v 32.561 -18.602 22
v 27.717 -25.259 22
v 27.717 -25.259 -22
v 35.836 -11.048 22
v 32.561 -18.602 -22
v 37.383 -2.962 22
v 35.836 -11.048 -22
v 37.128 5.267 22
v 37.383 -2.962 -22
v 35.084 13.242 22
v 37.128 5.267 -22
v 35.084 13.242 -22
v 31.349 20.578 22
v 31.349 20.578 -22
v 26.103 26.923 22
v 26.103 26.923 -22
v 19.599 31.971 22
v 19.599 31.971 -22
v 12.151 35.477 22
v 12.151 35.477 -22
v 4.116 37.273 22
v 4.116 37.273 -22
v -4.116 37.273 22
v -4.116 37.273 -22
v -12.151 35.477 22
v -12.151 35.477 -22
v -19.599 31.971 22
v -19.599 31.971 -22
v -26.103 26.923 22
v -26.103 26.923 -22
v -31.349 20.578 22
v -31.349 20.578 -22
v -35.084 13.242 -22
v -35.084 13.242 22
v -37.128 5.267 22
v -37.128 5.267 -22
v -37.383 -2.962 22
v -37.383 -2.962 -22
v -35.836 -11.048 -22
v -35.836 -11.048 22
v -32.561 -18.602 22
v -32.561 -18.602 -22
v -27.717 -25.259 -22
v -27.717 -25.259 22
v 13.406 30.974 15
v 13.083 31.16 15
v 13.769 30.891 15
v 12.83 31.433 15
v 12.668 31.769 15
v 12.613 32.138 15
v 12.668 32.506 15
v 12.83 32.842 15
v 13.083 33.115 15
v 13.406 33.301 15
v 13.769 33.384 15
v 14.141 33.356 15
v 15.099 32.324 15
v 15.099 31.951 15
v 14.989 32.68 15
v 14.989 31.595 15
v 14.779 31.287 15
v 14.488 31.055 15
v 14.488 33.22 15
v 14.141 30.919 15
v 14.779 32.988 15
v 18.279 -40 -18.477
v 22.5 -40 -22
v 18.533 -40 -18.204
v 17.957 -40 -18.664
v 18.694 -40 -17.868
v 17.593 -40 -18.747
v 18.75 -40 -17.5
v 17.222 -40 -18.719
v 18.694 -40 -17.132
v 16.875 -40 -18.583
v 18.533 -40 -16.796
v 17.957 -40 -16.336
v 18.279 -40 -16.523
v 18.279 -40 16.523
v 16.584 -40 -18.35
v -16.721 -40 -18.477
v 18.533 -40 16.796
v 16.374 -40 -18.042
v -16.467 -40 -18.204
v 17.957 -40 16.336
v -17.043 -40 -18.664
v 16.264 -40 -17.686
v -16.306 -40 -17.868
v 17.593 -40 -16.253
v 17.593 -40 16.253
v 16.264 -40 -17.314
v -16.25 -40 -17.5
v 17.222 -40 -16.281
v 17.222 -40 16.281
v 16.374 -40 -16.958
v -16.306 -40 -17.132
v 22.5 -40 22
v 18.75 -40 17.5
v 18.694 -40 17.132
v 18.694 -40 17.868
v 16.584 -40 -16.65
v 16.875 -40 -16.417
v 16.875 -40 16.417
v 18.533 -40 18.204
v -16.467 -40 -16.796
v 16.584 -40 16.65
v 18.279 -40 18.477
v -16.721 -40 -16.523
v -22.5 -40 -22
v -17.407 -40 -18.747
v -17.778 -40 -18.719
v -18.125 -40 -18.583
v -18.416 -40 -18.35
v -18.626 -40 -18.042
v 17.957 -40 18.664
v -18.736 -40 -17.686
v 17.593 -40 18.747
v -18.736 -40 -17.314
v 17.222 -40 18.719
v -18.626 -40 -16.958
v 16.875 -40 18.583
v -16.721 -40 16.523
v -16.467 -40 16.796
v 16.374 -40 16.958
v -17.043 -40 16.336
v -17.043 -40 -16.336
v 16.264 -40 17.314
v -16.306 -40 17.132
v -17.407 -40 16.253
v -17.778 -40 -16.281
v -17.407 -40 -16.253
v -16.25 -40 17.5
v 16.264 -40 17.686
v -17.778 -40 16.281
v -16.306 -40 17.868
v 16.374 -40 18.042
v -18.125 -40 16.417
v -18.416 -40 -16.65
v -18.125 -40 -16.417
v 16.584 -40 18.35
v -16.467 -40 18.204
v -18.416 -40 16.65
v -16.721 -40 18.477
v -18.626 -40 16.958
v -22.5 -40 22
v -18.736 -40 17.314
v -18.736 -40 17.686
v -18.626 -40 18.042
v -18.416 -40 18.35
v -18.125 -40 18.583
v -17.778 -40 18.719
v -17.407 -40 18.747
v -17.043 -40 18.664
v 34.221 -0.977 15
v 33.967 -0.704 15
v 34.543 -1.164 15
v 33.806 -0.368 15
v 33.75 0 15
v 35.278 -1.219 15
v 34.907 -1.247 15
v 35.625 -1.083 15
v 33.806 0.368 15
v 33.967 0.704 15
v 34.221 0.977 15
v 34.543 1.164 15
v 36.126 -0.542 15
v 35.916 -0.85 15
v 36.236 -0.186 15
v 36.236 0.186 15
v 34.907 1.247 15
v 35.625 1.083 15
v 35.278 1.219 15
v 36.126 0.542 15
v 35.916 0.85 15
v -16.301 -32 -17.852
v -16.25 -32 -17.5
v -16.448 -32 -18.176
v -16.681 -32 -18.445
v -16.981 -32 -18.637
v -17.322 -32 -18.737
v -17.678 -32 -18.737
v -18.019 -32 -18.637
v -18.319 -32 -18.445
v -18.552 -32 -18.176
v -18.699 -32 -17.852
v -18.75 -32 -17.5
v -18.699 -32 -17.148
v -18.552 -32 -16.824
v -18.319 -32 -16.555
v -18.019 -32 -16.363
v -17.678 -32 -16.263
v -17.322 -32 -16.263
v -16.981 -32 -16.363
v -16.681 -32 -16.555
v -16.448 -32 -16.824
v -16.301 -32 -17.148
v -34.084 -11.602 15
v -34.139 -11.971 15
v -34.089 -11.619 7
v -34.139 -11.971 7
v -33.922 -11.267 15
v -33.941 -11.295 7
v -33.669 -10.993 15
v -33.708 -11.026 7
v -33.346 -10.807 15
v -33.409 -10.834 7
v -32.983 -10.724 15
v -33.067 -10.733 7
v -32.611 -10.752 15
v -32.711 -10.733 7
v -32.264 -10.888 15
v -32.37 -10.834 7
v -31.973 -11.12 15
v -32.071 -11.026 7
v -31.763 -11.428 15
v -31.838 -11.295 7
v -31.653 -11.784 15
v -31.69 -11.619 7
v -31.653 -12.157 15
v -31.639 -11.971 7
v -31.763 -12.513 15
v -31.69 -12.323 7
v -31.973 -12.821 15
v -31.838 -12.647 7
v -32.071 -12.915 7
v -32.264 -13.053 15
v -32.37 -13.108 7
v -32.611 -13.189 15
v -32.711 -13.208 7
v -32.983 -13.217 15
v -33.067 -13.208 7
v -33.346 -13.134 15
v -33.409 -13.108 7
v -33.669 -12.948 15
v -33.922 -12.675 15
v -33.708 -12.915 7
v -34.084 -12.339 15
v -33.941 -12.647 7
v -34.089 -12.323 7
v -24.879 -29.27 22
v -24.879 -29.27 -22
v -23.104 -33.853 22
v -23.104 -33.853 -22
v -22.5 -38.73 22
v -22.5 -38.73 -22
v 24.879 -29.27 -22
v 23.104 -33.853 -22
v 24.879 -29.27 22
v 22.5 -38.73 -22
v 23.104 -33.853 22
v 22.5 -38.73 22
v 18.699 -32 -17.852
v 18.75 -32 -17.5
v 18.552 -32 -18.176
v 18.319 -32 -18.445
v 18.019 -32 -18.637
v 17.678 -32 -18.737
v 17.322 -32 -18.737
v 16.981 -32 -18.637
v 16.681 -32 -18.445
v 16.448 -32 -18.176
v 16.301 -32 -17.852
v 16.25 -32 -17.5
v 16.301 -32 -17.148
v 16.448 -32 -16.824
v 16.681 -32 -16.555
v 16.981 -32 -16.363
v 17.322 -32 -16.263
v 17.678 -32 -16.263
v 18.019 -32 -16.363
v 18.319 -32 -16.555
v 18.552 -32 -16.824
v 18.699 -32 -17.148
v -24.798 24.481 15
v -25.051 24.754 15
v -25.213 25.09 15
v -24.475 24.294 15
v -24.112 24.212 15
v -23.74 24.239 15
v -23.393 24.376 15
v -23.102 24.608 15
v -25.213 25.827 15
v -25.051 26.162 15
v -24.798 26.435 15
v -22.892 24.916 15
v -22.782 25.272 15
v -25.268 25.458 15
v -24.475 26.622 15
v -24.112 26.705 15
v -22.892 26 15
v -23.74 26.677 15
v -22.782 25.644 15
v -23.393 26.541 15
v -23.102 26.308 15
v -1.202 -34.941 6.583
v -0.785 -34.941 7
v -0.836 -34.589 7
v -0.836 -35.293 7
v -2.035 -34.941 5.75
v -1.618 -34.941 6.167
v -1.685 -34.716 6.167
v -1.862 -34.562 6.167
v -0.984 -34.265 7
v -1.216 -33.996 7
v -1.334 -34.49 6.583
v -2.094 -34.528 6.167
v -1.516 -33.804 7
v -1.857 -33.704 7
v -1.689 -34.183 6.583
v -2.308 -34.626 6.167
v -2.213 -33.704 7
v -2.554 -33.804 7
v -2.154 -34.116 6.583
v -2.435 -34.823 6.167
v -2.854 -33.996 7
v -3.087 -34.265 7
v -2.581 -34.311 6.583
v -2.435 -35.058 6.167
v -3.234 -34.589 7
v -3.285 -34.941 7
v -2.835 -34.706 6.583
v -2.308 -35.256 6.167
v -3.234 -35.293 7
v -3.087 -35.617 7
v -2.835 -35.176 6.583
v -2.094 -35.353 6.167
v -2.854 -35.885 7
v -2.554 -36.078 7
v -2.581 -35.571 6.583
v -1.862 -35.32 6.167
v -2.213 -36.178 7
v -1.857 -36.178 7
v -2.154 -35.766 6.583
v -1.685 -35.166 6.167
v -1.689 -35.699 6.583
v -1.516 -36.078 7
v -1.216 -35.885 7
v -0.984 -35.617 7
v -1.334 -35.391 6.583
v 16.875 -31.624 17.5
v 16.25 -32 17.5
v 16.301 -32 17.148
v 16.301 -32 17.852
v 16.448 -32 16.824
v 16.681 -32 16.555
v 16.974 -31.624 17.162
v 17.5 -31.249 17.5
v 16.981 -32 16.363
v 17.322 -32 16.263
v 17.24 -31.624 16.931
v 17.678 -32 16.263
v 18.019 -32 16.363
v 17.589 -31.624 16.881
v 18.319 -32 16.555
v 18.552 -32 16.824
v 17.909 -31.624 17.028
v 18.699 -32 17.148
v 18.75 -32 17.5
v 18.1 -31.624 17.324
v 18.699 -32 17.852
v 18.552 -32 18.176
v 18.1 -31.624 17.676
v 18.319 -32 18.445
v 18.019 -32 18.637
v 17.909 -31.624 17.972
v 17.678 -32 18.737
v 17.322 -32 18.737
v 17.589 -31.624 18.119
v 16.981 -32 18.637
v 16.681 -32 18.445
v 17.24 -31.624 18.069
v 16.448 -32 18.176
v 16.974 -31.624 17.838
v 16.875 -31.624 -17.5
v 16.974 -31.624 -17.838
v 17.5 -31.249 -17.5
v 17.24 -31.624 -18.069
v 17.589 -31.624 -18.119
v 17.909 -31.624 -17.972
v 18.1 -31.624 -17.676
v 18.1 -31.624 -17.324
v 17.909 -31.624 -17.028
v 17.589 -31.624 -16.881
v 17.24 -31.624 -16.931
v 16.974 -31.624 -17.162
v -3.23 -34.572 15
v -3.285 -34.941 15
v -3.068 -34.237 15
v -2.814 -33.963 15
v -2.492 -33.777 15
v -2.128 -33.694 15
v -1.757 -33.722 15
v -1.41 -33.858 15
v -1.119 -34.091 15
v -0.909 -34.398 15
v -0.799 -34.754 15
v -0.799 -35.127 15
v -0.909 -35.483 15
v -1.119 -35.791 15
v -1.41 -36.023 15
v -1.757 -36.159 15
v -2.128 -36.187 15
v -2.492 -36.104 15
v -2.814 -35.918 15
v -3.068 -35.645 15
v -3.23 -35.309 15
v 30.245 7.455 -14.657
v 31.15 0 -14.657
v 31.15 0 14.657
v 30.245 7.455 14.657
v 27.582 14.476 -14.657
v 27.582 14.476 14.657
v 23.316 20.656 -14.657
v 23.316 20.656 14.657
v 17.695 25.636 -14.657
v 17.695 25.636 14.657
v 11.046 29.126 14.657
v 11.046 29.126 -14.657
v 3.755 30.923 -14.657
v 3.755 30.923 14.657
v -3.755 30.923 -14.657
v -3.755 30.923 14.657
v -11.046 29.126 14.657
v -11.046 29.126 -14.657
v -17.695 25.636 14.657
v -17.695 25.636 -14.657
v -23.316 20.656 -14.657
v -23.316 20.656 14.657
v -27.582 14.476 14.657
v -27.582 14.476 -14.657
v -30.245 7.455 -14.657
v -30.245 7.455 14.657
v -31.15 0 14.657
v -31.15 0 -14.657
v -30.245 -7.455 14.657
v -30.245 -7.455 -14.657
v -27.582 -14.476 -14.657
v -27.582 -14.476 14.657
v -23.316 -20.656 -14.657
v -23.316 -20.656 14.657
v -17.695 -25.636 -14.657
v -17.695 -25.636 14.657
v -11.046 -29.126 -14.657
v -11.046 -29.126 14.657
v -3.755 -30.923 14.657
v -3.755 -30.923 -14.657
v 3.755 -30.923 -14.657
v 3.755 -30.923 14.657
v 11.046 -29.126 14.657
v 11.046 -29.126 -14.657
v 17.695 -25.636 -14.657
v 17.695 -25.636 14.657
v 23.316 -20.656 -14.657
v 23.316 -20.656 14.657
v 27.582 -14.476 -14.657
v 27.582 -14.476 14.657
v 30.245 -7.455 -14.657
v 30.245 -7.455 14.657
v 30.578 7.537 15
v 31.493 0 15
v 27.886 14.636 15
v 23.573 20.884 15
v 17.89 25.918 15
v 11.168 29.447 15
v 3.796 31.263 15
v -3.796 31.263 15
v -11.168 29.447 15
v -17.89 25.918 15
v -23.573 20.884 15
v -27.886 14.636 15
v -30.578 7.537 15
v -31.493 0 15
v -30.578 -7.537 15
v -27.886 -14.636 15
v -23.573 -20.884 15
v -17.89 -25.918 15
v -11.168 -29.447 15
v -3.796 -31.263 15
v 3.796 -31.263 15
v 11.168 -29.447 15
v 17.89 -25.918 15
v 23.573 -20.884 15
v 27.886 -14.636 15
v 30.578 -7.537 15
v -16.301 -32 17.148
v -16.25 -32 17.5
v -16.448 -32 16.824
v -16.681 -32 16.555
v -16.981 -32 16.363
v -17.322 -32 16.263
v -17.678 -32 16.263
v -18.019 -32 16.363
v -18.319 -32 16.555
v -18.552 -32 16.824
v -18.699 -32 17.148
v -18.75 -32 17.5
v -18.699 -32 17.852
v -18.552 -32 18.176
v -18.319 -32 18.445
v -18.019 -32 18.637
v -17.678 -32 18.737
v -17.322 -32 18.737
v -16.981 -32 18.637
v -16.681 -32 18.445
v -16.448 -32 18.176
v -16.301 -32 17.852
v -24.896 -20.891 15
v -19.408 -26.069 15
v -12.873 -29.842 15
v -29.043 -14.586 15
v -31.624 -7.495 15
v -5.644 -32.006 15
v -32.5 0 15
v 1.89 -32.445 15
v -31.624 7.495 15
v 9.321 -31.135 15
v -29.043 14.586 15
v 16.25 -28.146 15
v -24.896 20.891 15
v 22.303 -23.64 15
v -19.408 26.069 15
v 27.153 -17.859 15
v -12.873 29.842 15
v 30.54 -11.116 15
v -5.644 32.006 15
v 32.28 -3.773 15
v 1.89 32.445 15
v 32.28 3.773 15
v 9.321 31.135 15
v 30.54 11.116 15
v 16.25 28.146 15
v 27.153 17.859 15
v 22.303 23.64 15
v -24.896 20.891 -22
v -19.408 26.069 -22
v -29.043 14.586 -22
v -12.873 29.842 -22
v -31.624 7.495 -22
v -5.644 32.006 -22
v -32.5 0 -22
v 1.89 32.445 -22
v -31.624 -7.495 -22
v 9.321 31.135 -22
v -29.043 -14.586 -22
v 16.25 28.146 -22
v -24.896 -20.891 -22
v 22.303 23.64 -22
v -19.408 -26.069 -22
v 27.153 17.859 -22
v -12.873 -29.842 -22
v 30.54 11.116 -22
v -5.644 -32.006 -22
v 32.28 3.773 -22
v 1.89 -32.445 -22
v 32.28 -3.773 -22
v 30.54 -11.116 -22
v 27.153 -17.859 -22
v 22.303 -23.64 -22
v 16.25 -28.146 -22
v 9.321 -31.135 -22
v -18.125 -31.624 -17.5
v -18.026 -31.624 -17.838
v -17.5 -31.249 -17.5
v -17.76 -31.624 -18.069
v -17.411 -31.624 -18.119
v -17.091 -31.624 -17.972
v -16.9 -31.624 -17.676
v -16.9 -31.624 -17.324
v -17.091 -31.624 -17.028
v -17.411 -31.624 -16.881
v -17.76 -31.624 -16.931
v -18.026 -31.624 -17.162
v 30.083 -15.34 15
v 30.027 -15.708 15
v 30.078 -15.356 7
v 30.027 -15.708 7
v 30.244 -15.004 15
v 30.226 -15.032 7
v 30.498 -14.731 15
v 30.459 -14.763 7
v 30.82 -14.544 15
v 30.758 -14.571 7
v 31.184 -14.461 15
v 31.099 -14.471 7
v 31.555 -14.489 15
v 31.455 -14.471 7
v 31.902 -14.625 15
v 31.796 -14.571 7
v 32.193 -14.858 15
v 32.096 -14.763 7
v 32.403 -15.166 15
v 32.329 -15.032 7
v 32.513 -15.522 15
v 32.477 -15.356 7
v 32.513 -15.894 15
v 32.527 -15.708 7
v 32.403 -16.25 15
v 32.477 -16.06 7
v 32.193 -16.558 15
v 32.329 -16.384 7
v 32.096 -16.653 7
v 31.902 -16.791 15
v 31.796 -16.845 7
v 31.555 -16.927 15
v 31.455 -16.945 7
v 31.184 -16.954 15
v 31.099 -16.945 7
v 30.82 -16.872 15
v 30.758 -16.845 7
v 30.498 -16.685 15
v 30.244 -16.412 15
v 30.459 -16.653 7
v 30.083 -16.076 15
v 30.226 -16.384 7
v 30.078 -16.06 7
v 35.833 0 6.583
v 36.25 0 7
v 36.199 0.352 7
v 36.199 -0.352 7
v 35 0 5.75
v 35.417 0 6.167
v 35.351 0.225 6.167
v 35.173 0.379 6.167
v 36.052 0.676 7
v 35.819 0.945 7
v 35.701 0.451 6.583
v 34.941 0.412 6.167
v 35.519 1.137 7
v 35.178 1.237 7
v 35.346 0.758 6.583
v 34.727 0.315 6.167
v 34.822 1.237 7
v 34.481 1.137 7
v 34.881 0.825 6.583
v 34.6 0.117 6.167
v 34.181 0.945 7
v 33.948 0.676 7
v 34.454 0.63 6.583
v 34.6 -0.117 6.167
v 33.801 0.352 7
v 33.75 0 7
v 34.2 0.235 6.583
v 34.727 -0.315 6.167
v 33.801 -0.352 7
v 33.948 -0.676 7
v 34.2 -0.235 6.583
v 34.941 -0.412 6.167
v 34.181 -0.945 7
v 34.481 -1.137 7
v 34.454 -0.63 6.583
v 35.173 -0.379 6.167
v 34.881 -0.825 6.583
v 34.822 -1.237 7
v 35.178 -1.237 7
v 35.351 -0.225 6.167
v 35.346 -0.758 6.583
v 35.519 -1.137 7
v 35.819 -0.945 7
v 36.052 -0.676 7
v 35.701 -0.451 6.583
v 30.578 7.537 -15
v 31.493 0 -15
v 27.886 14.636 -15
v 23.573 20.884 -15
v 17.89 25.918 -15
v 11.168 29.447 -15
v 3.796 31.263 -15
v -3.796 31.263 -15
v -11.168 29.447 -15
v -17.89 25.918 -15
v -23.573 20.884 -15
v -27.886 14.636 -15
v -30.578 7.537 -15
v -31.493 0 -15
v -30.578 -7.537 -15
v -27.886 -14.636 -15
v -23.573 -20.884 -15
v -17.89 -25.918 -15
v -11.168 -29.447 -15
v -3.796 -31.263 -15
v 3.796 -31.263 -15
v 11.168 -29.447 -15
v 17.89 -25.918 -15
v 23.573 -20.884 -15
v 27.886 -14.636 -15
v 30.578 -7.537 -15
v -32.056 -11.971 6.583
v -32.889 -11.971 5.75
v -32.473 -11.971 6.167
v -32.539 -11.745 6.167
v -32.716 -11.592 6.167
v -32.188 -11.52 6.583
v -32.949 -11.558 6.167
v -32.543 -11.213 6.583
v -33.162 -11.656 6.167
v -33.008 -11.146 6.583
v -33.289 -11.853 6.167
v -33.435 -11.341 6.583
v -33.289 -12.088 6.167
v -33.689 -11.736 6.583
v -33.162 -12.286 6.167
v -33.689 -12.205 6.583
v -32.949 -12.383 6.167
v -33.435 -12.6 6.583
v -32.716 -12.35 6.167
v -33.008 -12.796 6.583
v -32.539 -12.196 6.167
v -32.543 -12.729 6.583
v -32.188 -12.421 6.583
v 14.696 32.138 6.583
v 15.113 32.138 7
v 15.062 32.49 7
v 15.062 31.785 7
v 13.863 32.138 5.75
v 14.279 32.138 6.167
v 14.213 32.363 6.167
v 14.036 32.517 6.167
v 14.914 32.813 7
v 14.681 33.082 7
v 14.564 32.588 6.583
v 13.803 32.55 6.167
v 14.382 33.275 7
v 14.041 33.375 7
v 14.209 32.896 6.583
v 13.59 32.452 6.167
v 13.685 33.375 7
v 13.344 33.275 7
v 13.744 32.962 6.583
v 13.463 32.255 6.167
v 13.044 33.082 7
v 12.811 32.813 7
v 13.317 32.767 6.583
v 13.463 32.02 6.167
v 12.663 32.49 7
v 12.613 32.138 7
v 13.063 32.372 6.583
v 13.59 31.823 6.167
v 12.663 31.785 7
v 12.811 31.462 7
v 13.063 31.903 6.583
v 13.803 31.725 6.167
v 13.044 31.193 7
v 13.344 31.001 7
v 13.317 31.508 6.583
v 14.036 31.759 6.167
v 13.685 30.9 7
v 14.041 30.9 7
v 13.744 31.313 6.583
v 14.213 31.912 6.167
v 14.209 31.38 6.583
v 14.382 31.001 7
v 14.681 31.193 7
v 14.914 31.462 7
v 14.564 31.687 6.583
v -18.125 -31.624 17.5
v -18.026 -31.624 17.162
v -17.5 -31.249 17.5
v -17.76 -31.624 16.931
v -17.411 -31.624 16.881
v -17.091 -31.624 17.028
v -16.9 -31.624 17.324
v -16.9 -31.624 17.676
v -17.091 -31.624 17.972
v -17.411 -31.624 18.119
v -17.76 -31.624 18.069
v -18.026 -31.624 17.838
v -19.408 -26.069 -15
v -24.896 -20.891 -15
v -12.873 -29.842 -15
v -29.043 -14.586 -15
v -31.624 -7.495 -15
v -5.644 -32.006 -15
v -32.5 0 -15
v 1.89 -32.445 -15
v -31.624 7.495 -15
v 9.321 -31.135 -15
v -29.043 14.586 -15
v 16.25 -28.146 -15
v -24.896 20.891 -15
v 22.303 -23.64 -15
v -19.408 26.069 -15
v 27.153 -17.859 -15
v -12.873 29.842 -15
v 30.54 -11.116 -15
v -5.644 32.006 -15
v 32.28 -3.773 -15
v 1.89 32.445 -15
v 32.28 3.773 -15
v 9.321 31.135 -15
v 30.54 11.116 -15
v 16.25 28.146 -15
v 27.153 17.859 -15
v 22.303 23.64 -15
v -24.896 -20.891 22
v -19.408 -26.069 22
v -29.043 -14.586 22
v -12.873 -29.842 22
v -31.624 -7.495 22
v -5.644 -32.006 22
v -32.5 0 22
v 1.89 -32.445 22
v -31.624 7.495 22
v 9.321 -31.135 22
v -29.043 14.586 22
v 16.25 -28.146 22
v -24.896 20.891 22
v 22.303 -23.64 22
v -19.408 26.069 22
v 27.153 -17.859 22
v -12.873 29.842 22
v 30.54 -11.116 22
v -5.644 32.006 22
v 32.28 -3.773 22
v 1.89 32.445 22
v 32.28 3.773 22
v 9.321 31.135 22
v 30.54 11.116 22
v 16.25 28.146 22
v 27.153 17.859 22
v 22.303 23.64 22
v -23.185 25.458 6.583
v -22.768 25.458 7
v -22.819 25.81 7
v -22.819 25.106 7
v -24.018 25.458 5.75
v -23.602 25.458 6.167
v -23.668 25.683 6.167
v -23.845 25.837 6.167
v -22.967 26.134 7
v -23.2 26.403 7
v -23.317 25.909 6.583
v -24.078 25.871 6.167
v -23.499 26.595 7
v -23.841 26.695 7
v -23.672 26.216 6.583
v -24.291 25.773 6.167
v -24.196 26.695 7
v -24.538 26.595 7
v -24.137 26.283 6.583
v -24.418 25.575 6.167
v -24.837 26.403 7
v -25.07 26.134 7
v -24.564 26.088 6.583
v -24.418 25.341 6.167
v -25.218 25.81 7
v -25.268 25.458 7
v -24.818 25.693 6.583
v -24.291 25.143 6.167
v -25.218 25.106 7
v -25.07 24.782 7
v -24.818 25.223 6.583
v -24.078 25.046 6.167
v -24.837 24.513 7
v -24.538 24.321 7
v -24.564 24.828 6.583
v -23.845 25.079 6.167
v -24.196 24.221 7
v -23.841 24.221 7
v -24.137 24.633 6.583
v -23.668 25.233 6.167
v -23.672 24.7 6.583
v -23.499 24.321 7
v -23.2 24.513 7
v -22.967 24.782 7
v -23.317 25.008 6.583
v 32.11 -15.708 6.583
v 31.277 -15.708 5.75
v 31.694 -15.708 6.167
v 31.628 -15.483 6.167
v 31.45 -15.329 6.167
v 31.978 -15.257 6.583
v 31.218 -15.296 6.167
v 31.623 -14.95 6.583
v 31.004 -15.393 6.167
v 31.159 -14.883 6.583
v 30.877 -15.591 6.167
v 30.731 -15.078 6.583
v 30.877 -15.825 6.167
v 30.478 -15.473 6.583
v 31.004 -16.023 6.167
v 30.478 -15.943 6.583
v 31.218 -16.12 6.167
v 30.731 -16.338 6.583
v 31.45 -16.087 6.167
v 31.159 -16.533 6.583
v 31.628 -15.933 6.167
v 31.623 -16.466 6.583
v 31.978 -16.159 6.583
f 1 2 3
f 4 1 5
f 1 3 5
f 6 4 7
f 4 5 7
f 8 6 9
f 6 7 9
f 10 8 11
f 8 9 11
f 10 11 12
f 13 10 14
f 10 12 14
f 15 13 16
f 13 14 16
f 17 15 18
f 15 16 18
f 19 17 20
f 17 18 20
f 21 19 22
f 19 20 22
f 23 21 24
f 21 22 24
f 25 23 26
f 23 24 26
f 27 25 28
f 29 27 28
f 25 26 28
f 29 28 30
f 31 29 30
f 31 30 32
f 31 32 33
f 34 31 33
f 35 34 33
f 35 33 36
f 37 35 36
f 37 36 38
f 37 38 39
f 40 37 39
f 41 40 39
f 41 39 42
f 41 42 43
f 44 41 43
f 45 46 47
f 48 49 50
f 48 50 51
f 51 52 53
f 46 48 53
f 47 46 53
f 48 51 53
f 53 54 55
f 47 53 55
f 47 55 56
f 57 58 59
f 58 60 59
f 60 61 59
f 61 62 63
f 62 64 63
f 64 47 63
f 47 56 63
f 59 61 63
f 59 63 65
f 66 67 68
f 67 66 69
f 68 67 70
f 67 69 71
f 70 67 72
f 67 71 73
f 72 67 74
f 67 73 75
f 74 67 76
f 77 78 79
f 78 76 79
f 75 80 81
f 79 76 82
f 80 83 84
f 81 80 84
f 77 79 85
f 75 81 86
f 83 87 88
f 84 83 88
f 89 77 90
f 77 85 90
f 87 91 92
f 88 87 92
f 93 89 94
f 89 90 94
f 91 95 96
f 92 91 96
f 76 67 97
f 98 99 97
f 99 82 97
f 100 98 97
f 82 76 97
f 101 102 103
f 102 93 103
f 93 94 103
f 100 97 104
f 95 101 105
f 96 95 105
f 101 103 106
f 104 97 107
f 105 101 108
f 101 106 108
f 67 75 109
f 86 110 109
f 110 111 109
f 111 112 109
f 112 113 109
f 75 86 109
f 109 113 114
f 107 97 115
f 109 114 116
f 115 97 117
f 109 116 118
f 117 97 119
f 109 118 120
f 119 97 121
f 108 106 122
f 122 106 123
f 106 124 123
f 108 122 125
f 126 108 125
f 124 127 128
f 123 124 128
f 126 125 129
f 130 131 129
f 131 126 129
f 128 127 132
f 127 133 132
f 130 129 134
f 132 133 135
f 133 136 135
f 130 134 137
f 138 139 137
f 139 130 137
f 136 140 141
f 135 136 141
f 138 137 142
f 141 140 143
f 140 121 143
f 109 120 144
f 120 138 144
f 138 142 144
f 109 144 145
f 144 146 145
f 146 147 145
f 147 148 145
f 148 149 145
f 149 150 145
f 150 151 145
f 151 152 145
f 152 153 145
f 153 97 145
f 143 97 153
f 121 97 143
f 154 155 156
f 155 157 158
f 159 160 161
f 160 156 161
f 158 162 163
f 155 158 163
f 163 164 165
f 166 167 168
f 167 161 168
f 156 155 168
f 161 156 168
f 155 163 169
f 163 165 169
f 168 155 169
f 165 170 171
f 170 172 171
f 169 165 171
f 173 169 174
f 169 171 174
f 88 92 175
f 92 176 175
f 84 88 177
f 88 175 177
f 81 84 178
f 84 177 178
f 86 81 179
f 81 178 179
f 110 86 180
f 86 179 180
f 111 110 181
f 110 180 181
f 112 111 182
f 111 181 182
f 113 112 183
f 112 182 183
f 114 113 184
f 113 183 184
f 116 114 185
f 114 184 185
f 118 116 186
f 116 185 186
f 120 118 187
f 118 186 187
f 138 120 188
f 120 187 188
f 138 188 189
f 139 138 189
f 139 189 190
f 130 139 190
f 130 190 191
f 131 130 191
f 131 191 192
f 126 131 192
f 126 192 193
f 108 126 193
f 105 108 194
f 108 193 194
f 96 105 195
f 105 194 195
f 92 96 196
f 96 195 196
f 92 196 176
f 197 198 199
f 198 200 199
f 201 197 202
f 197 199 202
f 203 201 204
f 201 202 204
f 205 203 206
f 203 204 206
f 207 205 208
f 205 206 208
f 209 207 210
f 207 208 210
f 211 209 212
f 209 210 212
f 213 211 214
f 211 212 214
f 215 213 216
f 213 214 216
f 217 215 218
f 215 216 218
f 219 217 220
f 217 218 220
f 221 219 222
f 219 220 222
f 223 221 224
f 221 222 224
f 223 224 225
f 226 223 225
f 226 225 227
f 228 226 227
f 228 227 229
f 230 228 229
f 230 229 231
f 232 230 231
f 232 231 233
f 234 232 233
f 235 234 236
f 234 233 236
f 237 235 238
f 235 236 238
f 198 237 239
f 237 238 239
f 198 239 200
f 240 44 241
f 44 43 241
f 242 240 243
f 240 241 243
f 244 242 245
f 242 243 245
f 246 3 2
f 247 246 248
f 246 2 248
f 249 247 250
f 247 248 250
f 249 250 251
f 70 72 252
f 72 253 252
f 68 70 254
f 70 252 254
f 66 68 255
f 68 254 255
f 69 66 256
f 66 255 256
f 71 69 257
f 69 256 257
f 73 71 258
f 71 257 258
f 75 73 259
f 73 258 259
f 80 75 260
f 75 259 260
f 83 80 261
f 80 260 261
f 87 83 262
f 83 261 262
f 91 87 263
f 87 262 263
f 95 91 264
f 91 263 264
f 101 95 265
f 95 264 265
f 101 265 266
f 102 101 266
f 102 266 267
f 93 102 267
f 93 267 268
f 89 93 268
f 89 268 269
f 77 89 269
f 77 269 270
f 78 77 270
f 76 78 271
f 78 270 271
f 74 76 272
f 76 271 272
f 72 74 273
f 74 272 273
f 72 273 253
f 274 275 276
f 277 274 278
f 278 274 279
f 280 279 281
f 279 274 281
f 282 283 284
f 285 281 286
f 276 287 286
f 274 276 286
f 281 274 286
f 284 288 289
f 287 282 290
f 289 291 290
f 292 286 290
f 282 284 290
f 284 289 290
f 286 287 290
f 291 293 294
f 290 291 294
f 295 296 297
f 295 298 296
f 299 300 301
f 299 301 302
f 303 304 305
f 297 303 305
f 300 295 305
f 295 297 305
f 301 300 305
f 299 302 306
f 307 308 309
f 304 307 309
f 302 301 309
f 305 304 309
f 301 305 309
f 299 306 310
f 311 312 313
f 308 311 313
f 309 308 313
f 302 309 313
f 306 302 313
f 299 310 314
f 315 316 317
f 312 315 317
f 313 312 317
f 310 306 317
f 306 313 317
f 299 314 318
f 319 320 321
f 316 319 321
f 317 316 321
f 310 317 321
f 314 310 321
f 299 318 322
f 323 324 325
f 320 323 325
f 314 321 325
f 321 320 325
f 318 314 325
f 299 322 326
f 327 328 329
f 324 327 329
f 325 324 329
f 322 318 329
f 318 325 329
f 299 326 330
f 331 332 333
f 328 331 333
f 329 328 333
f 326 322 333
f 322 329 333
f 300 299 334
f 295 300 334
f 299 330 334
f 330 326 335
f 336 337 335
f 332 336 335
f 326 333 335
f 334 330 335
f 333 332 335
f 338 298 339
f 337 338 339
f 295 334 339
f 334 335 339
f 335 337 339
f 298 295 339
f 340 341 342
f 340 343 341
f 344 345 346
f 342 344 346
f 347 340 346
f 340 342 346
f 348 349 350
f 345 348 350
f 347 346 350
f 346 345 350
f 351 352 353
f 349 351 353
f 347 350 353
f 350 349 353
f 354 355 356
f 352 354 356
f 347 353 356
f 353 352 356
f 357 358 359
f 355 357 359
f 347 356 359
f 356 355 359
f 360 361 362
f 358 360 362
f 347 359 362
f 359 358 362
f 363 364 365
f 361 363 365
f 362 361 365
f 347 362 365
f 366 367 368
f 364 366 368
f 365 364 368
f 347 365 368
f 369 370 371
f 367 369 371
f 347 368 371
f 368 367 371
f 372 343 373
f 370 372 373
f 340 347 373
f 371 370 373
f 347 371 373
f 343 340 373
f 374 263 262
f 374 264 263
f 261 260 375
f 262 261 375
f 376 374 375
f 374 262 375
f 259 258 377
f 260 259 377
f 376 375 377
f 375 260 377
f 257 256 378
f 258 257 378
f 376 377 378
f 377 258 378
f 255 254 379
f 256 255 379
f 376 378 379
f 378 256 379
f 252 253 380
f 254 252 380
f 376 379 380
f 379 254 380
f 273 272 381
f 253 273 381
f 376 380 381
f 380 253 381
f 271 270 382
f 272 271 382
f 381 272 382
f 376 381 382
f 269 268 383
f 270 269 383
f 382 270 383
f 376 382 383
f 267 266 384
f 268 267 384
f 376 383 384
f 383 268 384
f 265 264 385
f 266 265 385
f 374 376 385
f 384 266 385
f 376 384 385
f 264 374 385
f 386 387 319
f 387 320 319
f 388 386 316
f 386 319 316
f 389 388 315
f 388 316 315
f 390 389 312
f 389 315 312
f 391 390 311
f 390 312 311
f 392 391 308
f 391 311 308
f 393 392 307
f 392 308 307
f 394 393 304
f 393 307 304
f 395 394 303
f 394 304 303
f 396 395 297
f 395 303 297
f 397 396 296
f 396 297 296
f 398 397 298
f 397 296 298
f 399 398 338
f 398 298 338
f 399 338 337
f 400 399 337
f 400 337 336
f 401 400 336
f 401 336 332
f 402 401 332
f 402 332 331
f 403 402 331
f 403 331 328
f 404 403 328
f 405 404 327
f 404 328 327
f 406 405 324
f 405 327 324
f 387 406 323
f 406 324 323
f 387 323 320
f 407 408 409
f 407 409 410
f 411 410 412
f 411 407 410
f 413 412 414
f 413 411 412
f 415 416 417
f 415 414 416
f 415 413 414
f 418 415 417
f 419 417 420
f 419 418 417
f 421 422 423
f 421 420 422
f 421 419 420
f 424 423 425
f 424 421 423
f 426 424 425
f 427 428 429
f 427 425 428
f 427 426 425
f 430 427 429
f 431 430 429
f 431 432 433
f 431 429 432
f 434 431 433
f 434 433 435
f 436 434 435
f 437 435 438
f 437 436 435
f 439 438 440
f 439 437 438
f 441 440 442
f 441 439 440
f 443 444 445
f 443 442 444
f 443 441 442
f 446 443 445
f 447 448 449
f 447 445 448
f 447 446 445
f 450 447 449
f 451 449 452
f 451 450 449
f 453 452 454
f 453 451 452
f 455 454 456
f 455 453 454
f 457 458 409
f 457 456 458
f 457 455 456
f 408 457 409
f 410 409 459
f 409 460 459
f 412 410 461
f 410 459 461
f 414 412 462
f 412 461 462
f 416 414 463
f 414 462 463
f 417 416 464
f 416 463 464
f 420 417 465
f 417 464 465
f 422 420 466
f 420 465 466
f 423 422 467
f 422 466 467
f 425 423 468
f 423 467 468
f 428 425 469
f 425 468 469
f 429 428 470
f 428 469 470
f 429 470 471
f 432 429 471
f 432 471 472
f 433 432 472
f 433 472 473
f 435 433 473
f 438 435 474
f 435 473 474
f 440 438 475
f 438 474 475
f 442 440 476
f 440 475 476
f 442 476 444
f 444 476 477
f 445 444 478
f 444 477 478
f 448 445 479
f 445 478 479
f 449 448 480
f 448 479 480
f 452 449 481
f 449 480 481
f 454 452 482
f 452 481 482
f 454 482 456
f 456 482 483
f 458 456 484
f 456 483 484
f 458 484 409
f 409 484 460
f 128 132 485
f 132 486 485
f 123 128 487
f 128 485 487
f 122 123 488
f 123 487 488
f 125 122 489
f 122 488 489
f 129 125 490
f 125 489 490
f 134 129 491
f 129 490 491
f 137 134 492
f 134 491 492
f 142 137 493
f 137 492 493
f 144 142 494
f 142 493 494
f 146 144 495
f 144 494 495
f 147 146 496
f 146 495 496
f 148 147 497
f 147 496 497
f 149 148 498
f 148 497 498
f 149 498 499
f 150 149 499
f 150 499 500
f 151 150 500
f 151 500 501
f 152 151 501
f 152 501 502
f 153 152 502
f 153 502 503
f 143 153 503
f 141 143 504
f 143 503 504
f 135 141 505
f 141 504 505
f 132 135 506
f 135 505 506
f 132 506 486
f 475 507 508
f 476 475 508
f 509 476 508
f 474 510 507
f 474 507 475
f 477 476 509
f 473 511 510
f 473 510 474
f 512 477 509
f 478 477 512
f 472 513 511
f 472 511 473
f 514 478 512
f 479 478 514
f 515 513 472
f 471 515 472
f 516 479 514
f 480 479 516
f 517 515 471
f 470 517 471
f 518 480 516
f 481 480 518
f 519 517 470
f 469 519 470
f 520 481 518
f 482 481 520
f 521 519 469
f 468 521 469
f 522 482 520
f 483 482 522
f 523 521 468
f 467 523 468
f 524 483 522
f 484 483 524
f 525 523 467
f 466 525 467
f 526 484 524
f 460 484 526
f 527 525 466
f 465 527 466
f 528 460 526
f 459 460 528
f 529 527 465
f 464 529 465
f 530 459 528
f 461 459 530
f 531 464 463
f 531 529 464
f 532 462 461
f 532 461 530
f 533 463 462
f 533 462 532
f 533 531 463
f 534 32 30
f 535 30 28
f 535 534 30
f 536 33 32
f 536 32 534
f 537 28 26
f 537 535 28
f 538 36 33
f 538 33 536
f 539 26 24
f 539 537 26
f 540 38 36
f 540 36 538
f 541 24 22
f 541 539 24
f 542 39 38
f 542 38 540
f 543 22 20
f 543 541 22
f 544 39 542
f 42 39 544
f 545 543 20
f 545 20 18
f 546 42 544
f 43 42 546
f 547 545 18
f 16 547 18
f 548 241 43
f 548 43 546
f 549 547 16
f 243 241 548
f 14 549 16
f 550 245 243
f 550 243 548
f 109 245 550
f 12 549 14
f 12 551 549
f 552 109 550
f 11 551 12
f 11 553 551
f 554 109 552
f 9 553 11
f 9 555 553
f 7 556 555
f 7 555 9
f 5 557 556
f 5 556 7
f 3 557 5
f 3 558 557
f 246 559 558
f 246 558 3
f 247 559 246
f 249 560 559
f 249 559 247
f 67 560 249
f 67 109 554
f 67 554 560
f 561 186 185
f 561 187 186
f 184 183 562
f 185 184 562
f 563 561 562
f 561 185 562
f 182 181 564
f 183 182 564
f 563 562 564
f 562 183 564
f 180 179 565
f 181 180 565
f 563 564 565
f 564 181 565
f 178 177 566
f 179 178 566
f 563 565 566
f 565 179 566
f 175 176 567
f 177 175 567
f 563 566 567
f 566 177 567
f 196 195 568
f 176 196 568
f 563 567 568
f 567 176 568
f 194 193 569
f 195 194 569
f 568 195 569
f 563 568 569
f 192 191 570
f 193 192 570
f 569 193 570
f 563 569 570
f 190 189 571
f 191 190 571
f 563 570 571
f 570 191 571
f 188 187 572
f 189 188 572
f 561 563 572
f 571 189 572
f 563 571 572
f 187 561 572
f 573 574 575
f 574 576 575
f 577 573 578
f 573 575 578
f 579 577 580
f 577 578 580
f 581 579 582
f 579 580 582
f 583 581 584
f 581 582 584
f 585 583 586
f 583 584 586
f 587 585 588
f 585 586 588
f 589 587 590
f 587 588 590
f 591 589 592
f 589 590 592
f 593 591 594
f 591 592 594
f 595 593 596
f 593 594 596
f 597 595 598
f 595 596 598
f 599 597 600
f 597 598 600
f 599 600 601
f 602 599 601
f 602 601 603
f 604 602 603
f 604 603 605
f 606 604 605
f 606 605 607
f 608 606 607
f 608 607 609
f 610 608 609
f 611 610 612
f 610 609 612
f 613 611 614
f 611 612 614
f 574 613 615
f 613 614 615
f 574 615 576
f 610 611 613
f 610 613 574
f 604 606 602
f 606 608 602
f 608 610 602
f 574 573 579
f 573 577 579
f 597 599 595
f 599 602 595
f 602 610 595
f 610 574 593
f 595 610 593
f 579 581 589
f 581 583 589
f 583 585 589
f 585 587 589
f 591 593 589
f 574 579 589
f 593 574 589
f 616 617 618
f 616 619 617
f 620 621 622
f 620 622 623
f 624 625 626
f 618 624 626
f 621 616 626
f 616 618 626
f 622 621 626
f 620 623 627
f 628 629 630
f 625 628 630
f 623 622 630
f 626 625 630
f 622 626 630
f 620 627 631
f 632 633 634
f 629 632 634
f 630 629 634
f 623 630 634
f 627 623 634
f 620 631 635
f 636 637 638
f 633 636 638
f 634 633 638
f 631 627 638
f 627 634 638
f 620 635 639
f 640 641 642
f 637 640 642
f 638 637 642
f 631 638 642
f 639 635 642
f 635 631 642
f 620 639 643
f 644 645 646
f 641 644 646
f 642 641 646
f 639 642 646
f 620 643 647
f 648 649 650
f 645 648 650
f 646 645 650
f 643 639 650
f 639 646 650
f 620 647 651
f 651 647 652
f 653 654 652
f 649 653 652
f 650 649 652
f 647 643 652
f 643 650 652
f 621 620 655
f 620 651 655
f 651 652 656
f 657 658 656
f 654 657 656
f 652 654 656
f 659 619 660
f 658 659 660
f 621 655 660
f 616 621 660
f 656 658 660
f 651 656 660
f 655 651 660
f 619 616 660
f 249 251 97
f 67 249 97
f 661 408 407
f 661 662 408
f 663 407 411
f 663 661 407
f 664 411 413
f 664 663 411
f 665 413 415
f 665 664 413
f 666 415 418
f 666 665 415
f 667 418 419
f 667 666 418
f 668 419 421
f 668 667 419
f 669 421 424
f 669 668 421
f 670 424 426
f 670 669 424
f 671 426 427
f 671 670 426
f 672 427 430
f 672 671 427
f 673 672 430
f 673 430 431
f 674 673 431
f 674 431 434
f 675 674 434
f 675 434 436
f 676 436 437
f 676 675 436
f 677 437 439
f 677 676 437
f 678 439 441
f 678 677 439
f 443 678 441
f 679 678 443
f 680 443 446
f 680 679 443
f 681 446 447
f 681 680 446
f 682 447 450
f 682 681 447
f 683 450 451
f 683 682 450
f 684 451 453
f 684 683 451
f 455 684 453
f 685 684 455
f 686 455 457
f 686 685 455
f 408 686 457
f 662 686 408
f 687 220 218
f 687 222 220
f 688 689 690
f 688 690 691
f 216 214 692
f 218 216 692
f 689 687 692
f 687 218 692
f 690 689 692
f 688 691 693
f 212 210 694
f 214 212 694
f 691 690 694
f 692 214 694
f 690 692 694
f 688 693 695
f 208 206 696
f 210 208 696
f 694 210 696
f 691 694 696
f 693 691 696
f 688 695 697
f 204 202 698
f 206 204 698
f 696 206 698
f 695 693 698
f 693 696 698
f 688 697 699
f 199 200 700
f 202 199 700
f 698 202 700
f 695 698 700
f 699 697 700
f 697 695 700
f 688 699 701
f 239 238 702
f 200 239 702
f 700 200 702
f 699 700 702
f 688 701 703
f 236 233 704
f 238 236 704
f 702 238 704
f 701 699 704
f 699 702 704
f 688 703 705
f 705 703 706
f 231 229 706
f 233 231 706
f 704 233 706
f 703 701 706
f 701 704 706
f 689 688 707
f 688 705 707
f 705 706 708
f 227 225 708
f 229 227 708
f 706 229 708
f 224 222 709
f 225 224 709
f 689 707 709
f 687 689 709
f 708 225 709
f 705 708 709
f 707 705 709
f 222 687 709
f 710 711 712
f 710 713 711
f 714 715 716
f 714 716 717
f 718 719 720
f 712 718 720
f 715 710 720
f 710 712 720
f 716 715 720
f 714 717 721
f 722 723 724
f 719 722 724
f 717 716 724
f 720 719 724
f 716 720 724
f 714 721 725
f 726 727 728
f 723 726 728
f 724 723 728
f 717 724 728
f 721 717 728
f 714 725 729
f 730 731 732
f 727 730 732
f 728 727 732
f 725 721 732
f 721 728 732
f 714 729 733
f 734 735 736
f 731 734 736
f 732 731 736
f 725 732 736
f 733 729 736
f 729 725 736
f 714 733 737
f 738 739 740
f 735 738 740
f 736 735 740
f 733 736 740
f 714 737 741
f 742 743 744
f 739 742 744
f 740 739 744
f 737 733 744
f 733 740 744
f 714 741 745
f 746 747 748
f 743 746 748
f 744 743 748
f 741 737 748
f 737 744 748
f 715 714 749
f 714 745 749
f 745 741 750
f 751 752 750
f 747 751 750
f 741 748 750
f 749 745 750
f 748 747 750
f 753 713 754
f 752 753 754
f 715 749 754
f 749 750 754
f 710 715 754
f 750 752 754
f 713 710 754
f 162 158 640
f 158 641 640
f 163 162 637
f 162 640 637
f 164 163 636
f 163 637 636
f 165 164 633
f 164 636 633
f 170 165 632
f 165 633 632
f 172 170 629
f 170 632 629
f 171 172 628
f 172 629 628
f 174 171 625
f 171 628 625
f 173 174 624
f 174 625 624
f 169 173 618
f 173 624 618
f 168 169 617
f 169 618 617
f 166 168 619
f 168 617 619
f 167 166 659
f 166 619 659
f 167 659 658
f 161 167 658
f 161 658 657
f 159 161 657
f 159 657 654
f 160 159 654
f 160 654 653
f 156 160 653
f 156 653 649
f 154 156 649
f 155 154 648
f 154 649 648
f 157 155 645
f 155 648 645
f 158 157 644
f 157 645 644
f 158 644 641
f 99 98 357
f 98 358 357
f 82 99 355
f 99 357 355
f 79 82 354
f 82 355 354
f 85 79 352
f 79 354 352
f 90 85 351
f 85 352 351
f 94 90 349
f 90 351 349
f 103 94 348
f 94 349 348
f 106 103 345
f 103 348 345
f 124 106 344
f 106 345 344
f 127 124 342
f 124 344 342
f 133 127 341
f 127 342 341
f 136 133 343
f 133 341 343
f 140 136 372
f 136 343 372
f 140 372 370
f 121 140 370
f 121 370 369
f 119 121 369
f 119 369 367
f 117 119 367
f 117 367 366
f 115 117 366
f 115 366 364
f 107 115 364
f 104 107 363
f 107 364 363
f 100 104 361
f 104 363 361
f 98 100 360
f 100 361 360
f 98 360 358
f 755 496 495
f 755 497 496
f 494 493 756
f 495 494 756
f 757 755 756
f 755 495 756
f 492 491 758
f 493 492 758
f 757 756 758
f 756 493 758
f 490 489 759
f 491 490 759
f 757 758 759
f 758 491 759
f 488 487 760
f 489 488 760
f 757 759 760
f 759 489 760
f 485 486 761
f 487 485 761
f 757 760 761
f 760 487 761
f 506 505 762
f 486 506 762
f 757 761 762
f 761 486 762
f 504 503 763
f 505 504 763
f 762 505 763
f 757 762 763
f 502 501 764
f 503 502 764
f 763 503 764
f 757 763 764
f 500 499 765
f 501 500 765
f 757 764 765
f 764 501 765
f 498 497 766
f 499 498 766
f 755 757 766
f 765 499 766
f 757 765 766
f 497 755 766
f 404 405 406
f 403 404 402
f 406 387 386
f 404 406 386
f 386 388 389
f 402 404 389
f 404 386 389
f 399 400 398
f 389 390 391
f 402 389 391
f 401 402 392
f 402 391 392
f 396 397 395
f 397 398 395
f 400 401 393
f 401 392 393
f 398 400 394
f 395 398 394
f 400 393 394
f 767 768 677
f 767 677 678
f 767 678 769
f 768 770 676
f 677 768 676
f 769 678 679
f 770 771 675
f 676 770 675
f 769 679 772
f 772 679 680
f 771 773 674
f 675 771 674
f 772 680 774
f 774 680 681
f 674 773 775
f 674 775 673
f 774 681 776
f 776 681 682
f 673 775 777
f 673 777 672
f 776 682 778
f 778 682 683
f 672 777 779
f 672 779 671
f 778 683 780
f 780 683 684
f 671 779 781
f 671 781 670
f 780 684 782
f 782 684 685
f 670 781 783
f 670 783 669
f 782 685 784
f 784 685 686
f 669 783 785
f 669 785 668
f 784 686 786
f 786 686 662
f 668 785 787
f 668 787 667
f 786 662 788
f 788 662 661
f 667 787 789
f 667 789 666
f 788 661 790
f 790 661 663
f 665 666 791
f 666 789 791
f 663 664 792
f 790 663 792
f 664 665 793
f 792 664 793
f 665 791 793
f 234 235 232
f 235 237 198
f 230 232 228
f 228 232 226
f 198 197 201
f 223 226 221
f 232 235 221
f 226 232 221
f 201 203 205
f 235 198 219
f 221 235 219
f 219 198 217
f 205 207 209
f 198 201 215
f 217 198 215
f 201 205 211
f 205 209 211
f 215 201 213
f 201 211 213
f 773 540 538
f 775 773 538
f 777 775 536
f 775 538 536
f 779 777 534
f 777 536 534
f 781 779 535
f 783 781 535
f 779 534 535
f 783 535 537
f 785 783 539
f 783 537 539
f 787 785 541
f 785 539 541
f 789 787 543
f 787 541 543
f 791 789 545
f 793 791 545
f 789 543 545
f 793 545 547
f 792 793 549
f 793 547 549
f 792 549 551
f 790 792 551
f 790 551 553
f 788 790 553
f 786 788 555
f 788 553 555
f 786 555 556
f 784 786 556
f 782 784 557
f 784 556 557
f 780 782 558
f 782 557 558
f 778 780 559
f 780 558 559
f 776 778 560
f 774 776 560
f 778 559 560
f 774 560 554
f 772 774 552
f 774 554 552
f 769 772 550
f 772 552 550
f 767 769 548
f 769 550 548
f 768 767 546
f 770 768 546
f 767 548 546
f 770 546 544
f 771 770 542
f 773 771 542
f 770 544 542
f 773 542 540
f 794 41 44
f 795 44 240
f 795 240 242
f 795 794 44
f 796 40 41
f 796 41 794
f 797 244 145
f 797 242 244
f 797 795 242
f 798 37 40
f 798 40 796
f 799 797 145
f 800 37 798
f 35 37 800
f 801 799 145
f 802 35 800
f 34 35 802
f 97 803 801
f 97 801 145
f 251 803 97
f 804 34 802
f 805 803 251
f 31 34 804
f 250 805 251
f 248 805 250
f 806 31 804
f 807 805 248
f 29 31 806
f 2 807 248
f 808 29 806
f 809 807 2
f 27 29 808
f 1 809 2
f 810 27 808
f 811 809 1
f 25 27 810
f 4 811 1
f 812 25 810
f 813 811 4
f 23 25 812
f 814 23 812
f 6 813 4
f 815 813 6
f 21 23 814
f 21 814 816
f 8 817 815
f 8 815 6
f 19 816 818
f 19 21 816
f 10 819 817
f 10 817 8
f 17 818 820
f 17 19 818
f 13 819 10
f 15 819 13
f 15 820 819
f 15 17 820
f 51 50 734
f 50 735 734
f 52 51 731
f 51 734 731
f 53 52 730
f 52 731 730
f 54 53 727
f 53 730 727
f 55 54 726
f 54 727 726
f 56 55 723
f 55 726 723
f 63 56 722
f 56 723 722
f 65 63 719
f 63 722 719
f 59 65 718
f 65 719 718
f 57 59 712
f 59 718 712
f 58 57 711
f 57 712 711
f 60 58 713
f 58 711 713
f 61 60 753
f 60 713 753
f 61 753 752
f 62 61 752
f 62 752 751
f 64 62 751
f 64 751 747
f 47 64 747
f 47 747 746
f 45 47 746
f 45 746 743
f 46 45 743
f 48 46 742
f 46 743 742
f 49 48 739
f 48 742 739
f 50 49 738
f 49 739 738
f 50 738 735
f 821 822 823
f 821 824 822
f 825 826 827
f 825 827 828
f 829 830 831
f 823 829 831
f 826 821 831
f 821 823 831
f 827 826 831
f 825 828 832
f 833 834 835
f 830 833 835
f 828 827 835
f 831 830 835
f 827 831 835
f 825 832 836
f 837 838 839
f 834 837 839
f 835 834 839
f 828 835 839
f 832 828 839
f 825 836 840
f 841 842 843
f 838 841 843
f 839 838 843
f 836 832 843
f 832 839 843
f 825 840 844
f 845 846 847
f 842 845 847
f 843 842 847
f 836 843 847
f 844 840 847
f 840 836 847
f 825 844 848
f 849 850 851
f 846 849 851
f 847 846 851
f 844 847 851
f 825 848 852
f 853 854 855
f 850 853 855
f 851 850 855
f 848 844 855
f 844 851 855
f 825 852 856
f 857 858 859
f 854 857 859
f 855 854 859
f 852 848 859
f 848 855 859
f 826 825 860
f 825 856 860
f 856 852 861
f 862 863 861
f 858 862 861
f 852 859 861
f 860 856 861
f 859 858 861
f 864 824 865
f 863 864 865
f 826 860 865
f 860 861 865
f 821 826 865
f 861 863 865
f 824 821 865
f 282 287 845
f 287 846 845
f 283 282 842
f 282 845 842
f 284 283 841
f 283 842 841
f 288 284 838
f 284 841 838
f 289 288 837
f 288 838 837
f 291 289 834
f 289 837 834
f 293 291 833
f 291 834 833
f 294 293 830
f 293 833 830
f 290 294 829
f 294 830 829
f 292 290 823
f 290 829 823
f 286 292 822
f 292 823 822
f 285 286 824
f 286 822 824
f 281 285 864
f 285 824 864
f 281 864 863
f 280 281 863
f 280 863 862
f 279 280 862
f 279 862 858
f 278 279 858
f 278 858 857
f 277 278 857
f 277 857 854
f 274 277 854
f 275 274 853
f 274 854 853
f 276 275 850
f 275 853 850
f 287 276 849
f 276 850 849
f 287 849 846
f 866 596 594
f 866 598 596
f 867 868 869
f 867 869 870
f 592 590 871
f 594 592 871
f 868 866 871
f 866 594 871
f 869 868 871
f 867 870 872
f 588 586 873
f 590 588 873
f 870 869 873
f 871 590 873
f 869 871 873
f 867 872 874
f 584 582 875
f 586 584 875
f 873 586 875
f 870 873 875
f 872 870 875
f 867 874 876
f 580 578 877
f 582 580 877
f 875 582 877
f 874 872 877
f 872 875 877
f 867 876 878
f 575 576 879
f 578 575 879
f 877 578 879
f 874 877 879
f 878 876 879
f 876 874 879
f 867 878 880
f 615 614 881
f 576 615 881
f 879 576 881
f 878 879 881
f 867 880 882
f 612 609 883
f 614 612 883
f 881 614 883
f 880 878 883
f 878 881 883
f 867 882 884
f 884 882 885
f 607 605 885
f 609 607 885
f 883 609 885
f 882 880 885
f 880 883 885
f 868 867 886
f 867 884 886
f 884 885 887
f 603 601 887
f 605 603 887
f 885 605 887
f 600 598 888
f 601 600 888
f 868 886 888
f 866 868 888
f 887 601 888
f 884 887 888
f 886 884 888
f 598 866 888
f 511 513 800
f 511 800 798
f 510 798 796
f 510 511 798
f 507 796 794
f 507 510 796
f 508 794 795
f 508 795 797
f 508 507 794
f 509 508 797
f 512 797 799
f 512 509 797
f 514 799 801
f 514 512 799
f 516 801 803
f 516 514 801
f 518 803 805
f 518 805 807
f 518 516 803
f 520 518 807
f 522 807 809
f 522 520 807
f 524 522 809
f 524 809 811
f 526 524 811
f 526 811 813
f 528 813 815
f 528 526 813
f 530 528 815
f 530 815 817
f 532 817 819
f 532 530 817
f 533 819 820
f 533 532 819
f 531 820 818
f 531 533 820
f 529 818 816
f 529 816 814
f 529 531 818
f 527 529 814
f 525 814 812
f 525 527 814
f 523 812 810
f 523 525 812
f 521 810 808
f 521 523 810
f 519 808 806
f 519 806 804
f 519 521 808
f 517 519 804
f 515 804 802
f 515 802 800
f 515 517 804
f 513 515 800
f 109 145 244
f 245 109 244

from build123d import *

# Parameters (mm, degrees)
EXTRUSION1_DEPTH              = 15
EXTRUSION1_DEPTH_BACK         = 15
SKETCH1_R                     = 37.5
SKETCH1_R_2                   = 31.15
HOLE4_D                       = 2.5
HOLE4_DEPTH                   = 8
HOLE4_TIP                     = 1.25
SKETCH5_R                     = 37.5
SKETCH5_R_2                   = 32.5
EXTRUSION11_DEPTH             = 7
EXTRUSION17_START             = 7
SKETCH6_R                     = 37.5
SKETCH6_R_2                   = 32.5
EXTRUSION17_DEPTH             = 7
EXTRUSION18_REACH             = 59.415
EXTRUSION18_DIRECTION_2_REACH = 59.415
FILLET5_R                     = 20
HOLE6_D                       = 2.5
HOLE6_DEPTH                   = 8
HOLE6_TIP                     = 0.751075774


with BuildPart() as part:
    # Sketch1 → Extrusion1 (new, two sides: drawn at the far end of the back side and taken through both)
    with BuildSketch(Plane.XY.offset(-EXTRUSION1_DEPTH_BACK)):
        Circle(SKETCH1_R)
        Circle(SKETCH1_R_2, mode=Mode.SUBTRACT)
    extrude(amount=EXTRUSION1_DEPTH + EXTRUSION1_DEPTH_BACK)

    # Hole4
    with Locations(Plane.XY.offset(15)):
        with Locations((35, 0), (13.862791811, 32.137563741), (-24.018457325, 25.458077455), (-32.889241728, -11.970705016), (-2.035069012, -34.940785539), (31.277142411, -15.707971307)):
            Hole(HOLE4_D / 2, depth=HOLE4_DEPTH)
            with Locations((0, 0, -(HOLE4_DEPTH + HOLE4_TIP / 2))):  # 90° drill point
                Cone(0, HOLE4_D / 2, HOLE4_TIP, mode=Mode.SUBTRACT)

    # Sketch5 → Extrusion11 (add)
    with BuildSketch(Plane(origin=(0, 0, -15), x_dir=(-1, 0, 0), z_dir=(0, 0, -1))):
        Circle(SKETCH5_R)
        Circle(SKETCH5_R_2, mode=Mode.SUBTRACT)
    extrude(amount=EXTRUSION11_DEPTH)

    # Sketch6 → Extrusion17 (add)
    with BuildSketch(Plane.XY.offset(15).offset(EXTRUSION17_START)):
        Circle(SKETCH6_R)
        Circle(SKETCH6_R_2, mode=Mode.SUBTRACT)
    extrude(amount=-EXTRUSION17_DEPTH)

    # Extrusion18: up to this face of the body (flat: up to its plane)
    extrusion18_end = Plane(part.part.faces().sort_by_distance((-36.439339828, 0, 22))[0])
    # Sketch7 → Extrusion18 (add, up to the picked face)
    with BuildSketch(Plane.XY, mode=Mode.PRIVATE) as extrusion18_sk1:
        with BuildLine():
            Line((22.5, -40), (-22.5, -40))
            Line((-22.5, -40), (-22.5, -30))
            ThreePointArc((-22.5, -30), (0, -37.5), (22.5, -30))
            Line((22.5, -30), (22.5, -40))
        make_face()
    extrusion18_tool1 = split(extrude(extrusion18_sk1.sketch, amount=EXTRUSION18_REACH, mode=Mode.PRIVATE), bisect_by=extrusion18_end, keep=Keep.BOTH, mode=Mode.PRIVATE)
    add(extrusion18_tool1.solids().sort_by(Axis((22.039023, -35, 0), (0, 0, 1)))[0])

    # Extrusion18 direction 2: up to this face of the body (flat: up to its plane)
    extrusion18_direction_2_end = Plane(part.part.faces().sort_by_distance((36.439339828, 0, -22))[0])
    # Sketch7 → Extrusion18 direction 2 (add, up to the picked face)
    with BuildSketch(Plane.XY, mode=Mode.PRIVATE) as extrusion18_direction_2_sk1:
        with BuildLine():
            Line((22.5, -40), (-22.5, -40))
            Line((-22.5, -40), (-22.5, -30))
            ThreePointArc((-22.5, -30), (0, -37.5), (22.5, -30))
            Line((22.5, -30), (22.5, -40))
        make_face()
    extrusion18_direction_2_tool1 = split(extrude(extrusion18_direction_2_sk1.sketch, amount=-EXTRUSION18_DIRECTION_2_REACH, mode=Mode.PRIVATE), bisect_by=extrusion18_direction_2_end, keep=Keep.BOTH, mode=Mode.PRIVATE)
    add(extrusion18_direction_2_tool1.solids().sort_by(Axis((22.039023, -35, 0), (0, 0, -1)))[0])

    # Fillet5
    fillet5_edges = [part.edges().sort_by_distance(p)[0] for p in [
        (22.5, -30, 0),
        (-22.5, -30, 0),
    ]]
    fillet(fillet5_edges, radius=FILLET5_R)

    # Sketch8 → Revolution1 (revolve, cut)
    with BuildSketch(Plane.YZ):
        Polygon((31.493036454, 15), (30.493036454, 15), (30.493036454, 14), align=None)
    revolution1 = revolve(axis=Axis((0, 0, 0), (0, 0, 1)), mode=Mode.SUBTRACT)

    # Mirror1: Revolution1 across plane
    add(revolution1.mirror(Plane.XY), mode=Mode.SUBTRACT)

    # Hole6
    with Locations(Plane(origin=(0, -40, 0), x_dir=(-1, 0, 0), z_dir=(0, -1, 0))):
        with Locations((-17.5, -17.5), (-17.5, 17.5), (17.5, -17.5), (17.5, 17.5)):
            Hole(HOLE6_D / 2, depth=HOLE6_DEPTH)
            with Locations((0, 0, -(HOLE6_DEPTH + HOLE6_TIP / 2))):  # 118° drill point
                Cone(0, HOLE6_D / 2, HOLE6_TIP, mode=Mode.SUBTRACT)


solid = part.part
